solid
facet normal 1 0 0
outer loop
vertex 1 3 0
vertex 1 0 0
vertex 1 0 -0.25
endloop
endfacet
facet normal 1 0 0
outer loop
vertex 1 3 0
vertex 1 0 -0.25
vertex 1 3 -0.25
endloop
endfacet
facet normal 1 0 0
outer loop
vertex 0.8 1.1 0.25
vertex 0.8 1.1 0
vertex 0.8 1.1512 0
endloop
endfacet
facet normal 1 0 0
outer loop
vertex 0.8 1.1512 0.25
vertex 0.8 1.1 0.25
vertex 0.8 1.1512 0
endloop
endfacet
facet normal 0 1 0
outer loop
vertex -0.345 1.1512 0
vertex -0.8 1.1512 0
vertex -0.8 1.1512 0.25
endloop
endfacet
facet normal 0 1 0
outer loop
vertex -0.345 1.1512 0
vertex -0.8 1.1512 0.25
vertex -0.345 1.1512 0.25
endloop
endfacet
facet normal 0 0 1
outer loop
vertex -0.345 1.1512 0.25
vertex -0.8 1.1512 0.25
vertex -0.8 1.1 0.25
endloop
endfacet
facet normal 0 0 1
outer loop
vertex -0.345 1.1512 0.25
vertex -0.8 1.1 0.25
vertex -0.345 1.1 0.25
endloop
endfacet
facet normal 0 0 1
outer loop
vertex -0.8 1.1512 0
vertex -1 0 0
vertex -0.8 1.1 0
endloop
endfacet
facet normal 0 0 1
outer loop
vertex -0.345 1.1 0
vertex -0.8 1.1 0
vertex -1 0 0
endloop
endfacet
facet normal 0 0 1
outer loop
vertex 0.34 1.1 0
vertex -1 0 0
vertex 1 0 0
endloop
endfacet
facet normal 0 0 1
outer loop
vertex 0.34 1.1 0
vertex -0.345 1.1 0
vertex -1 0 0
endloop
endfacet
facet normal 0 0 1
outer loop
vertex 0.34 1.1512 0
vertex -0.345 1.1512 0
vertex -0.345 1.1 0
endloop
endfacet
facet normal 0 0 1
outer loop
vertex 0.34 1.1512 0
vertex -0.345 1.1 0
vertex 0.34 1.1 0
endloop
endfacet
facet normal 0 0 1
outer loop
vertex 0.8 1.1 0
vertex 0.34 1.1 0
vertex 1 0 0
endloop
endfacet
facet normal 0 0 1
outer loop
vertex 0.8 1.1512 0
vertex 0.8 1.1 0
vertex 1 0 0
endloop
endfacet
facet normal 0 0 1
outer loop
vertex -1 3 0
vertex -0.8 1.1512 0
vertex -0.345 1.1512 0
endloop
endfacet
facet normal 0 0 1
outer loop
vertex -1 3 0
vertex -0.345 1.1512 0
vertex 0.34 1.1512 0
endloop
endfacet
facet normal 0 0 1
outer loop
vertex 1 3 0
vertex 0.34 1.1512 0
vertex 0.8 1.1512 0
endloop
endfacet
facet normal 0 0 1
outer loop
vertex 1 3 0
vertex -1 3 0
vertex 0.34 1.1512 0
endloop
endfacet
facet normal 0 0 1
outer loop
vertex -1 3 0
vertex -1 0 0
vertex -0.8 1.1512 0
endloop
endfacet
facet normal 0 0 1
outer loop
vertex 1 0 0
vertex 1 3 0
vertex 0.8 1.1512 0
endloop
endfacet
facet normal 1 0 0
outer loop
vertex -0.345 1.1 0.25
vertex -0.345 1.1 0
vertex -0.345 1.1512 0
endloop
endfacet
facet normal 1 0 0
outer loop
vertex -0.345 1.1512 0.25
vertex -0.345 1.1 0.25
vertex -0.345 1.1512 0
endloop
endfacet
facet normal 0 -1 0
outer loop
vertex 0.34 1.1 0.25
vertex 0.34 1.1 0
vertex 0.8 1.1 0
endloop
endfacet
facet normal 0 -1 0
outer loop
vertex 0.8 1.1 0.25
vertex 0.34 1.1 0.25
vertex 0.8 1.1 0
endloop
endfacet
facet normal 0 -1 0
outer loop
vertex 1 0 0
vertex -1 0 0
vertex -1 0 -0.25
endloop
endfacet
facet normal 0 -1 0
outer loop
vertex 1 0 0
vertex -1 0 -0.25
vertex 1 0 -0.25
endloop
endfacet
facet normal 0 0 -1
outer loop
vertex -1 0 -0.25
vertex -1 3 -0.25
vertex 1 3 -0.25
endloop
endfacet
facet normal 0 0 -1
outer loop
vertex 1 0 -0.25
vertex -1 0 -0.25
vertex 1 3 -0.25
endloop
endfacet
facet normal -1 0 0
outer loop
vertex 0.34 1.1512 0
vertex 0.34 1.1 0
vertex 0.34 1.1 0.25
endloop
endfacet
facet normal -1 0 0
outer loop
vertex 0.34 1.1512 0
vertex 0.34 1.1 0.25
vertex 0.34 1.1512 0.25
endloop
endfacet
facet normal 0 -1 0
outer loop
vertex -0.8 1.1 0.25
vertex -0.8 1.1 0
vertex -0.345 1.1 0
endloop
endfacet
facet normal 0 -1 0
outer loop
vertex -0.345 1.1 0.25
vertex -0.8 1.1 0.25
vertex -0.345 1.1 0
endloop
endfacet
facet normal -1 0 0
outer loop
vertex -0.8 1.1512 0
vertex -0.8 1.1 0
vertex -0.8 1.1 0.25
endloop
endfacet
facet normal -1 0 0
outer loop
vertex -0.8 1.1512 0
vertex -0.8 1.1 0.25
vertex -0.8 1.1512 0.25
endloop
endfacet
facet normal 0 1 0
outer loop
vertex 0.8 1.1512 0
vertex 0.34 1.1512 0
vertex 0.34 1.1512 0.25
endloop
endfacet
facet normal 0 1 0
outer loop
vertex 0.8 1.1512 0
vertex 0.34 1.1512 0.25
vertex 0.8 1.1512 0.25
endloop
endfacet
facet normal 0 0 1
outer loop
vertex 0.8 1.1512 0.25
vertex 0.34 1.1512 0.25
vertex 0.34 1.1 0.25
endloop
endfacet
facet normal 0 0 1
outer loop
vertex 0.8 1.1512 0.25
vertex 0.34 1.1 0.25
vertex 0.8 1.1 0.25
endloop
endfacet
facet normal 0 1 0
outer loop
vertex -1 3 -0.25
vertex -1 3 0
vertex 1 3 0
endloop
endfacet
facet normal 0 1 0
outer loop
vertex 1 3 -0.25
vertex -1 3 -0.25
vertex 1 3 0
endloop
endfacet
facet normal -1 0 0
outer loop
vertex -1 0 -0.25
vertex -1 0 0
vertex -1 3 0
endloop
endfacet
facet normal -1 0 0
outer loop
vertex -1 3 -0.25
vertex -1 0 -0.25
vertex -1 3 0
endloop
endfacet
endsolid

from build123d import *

# Parameters (mm, degrees)
SKETCH1_W           = 2
SKETCH1_H           = 3
BOSS_EXTRUDE1_DEPTH = 0.25
SKETCH2_W           = 0.455012626
SKETCH2_H           = 0.051193531
SKETCH2_W_2         = 0.46
BOSS_EXTRUDE2_DEPTH = 0.25


with BuildPart() as part:
    # Sketch1 → Boss-Extrude1 (new body)
    with BuildSketch(Plane.XY):
        with Locations((0, 1.5)):
            Rectangle(SKETCH1_W, SKETCH1_H)
    extrude(amount=-BOSS_EXTRUDE1_DEPTH)

    # Sketch2 → Boss-Extrude2 (add)
    with BuildSketch(Plane.XY):
        with Locations((-0.572493687, 1.125596766)):
            Rectangle(SKETCH2_W, SKETCH2_H)
        with Locations((0.57, 1.125596766)):
            Rectangle(SKETCH2_W_2, SKETCH2_H)
    extrude(amount=BOSS_EXTRUDE2_DEPTH)


solid = part.part
